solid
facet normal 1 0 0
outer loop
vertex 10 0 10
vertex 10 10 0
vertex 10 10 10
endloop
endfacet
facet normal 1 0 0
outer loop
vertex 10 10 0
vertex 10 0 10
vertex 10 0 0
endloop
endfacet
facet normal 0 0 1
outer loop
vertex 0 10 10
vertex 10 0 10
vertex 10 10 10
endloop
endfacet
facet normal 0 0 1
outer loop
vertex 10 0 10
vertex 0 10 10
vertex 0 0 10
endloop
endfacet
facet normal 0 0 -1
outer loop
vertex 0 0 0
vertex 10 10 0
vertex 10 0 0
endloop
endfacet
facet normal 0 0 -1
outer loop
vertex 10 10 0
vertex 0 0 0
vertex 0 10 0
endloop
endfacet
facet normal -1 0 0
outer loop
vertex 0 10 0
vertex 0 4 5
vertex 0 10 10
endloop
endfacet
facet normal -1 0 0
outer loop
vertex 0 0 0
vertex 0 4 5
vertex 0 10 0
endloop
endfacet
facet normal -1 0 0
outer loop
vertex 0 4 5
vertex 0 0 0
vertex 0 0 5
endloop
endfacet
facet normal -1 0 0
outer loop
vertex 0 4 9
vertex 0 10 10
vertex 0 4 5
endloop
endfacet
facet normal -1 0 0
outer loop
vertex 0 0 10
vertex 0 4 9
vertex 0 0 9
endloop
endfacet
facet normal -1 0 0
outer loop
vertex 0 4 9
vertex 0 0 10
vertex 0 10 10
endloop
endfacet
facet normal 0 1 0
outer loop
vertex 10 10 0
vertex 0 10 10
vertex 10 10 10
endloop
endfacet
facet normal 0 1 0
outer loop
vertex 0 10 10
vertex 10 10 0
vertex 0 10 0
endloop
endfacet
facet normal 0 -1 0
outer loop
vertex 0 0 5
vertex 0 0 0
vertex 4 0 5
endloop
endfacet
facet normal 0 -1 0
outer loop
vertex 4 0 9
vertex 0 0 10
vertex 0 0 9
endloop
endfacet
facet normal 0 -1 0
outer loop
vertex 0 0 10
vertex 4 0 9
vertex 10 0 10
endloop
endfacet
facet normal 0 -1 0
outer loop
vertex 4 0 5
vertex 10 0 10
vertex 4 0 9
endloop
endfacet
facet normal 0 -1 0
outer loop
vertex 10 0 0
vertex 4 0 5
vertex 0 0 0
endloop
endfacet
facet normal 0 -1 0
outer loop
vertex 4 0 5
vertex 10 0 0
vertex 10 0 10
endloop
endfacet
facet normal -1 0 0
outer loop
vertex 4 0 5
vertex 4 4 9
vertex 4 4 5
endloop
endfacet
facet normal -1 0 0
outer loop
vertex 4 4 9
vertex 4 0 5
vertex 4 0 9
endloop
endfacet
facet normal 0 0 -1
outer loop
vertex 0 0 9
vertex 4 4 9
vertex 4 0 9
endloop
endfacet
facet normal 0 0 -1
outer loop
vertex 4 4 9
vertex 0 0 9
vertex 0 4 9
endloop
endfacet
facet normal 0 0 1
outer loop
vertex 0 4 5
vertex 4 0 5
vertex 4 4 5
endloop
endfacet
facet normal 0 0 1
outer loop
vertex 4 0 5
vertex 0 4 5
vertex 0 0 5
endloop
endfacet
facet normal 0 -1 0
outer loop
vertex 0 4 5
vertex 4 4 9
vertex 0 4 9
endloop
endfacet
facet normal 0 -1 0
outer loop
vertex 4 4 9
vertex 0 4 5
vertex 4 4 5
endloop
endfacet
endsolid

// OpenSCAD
// color() as a DIFFERENCE OPERAND. Verified at openscad 2026.08.07: this exports
// BYTE-IDENTICAL ASCII STL to the same program with the color() removed (28
// facets), so the wrapper does not change which operand is the minuend.
difference() {
  color([0, 0, 0, 1]) cube([10, 10, 10]);
  translate([0, 0, 5]) cube([4, 4, 4]);
}
